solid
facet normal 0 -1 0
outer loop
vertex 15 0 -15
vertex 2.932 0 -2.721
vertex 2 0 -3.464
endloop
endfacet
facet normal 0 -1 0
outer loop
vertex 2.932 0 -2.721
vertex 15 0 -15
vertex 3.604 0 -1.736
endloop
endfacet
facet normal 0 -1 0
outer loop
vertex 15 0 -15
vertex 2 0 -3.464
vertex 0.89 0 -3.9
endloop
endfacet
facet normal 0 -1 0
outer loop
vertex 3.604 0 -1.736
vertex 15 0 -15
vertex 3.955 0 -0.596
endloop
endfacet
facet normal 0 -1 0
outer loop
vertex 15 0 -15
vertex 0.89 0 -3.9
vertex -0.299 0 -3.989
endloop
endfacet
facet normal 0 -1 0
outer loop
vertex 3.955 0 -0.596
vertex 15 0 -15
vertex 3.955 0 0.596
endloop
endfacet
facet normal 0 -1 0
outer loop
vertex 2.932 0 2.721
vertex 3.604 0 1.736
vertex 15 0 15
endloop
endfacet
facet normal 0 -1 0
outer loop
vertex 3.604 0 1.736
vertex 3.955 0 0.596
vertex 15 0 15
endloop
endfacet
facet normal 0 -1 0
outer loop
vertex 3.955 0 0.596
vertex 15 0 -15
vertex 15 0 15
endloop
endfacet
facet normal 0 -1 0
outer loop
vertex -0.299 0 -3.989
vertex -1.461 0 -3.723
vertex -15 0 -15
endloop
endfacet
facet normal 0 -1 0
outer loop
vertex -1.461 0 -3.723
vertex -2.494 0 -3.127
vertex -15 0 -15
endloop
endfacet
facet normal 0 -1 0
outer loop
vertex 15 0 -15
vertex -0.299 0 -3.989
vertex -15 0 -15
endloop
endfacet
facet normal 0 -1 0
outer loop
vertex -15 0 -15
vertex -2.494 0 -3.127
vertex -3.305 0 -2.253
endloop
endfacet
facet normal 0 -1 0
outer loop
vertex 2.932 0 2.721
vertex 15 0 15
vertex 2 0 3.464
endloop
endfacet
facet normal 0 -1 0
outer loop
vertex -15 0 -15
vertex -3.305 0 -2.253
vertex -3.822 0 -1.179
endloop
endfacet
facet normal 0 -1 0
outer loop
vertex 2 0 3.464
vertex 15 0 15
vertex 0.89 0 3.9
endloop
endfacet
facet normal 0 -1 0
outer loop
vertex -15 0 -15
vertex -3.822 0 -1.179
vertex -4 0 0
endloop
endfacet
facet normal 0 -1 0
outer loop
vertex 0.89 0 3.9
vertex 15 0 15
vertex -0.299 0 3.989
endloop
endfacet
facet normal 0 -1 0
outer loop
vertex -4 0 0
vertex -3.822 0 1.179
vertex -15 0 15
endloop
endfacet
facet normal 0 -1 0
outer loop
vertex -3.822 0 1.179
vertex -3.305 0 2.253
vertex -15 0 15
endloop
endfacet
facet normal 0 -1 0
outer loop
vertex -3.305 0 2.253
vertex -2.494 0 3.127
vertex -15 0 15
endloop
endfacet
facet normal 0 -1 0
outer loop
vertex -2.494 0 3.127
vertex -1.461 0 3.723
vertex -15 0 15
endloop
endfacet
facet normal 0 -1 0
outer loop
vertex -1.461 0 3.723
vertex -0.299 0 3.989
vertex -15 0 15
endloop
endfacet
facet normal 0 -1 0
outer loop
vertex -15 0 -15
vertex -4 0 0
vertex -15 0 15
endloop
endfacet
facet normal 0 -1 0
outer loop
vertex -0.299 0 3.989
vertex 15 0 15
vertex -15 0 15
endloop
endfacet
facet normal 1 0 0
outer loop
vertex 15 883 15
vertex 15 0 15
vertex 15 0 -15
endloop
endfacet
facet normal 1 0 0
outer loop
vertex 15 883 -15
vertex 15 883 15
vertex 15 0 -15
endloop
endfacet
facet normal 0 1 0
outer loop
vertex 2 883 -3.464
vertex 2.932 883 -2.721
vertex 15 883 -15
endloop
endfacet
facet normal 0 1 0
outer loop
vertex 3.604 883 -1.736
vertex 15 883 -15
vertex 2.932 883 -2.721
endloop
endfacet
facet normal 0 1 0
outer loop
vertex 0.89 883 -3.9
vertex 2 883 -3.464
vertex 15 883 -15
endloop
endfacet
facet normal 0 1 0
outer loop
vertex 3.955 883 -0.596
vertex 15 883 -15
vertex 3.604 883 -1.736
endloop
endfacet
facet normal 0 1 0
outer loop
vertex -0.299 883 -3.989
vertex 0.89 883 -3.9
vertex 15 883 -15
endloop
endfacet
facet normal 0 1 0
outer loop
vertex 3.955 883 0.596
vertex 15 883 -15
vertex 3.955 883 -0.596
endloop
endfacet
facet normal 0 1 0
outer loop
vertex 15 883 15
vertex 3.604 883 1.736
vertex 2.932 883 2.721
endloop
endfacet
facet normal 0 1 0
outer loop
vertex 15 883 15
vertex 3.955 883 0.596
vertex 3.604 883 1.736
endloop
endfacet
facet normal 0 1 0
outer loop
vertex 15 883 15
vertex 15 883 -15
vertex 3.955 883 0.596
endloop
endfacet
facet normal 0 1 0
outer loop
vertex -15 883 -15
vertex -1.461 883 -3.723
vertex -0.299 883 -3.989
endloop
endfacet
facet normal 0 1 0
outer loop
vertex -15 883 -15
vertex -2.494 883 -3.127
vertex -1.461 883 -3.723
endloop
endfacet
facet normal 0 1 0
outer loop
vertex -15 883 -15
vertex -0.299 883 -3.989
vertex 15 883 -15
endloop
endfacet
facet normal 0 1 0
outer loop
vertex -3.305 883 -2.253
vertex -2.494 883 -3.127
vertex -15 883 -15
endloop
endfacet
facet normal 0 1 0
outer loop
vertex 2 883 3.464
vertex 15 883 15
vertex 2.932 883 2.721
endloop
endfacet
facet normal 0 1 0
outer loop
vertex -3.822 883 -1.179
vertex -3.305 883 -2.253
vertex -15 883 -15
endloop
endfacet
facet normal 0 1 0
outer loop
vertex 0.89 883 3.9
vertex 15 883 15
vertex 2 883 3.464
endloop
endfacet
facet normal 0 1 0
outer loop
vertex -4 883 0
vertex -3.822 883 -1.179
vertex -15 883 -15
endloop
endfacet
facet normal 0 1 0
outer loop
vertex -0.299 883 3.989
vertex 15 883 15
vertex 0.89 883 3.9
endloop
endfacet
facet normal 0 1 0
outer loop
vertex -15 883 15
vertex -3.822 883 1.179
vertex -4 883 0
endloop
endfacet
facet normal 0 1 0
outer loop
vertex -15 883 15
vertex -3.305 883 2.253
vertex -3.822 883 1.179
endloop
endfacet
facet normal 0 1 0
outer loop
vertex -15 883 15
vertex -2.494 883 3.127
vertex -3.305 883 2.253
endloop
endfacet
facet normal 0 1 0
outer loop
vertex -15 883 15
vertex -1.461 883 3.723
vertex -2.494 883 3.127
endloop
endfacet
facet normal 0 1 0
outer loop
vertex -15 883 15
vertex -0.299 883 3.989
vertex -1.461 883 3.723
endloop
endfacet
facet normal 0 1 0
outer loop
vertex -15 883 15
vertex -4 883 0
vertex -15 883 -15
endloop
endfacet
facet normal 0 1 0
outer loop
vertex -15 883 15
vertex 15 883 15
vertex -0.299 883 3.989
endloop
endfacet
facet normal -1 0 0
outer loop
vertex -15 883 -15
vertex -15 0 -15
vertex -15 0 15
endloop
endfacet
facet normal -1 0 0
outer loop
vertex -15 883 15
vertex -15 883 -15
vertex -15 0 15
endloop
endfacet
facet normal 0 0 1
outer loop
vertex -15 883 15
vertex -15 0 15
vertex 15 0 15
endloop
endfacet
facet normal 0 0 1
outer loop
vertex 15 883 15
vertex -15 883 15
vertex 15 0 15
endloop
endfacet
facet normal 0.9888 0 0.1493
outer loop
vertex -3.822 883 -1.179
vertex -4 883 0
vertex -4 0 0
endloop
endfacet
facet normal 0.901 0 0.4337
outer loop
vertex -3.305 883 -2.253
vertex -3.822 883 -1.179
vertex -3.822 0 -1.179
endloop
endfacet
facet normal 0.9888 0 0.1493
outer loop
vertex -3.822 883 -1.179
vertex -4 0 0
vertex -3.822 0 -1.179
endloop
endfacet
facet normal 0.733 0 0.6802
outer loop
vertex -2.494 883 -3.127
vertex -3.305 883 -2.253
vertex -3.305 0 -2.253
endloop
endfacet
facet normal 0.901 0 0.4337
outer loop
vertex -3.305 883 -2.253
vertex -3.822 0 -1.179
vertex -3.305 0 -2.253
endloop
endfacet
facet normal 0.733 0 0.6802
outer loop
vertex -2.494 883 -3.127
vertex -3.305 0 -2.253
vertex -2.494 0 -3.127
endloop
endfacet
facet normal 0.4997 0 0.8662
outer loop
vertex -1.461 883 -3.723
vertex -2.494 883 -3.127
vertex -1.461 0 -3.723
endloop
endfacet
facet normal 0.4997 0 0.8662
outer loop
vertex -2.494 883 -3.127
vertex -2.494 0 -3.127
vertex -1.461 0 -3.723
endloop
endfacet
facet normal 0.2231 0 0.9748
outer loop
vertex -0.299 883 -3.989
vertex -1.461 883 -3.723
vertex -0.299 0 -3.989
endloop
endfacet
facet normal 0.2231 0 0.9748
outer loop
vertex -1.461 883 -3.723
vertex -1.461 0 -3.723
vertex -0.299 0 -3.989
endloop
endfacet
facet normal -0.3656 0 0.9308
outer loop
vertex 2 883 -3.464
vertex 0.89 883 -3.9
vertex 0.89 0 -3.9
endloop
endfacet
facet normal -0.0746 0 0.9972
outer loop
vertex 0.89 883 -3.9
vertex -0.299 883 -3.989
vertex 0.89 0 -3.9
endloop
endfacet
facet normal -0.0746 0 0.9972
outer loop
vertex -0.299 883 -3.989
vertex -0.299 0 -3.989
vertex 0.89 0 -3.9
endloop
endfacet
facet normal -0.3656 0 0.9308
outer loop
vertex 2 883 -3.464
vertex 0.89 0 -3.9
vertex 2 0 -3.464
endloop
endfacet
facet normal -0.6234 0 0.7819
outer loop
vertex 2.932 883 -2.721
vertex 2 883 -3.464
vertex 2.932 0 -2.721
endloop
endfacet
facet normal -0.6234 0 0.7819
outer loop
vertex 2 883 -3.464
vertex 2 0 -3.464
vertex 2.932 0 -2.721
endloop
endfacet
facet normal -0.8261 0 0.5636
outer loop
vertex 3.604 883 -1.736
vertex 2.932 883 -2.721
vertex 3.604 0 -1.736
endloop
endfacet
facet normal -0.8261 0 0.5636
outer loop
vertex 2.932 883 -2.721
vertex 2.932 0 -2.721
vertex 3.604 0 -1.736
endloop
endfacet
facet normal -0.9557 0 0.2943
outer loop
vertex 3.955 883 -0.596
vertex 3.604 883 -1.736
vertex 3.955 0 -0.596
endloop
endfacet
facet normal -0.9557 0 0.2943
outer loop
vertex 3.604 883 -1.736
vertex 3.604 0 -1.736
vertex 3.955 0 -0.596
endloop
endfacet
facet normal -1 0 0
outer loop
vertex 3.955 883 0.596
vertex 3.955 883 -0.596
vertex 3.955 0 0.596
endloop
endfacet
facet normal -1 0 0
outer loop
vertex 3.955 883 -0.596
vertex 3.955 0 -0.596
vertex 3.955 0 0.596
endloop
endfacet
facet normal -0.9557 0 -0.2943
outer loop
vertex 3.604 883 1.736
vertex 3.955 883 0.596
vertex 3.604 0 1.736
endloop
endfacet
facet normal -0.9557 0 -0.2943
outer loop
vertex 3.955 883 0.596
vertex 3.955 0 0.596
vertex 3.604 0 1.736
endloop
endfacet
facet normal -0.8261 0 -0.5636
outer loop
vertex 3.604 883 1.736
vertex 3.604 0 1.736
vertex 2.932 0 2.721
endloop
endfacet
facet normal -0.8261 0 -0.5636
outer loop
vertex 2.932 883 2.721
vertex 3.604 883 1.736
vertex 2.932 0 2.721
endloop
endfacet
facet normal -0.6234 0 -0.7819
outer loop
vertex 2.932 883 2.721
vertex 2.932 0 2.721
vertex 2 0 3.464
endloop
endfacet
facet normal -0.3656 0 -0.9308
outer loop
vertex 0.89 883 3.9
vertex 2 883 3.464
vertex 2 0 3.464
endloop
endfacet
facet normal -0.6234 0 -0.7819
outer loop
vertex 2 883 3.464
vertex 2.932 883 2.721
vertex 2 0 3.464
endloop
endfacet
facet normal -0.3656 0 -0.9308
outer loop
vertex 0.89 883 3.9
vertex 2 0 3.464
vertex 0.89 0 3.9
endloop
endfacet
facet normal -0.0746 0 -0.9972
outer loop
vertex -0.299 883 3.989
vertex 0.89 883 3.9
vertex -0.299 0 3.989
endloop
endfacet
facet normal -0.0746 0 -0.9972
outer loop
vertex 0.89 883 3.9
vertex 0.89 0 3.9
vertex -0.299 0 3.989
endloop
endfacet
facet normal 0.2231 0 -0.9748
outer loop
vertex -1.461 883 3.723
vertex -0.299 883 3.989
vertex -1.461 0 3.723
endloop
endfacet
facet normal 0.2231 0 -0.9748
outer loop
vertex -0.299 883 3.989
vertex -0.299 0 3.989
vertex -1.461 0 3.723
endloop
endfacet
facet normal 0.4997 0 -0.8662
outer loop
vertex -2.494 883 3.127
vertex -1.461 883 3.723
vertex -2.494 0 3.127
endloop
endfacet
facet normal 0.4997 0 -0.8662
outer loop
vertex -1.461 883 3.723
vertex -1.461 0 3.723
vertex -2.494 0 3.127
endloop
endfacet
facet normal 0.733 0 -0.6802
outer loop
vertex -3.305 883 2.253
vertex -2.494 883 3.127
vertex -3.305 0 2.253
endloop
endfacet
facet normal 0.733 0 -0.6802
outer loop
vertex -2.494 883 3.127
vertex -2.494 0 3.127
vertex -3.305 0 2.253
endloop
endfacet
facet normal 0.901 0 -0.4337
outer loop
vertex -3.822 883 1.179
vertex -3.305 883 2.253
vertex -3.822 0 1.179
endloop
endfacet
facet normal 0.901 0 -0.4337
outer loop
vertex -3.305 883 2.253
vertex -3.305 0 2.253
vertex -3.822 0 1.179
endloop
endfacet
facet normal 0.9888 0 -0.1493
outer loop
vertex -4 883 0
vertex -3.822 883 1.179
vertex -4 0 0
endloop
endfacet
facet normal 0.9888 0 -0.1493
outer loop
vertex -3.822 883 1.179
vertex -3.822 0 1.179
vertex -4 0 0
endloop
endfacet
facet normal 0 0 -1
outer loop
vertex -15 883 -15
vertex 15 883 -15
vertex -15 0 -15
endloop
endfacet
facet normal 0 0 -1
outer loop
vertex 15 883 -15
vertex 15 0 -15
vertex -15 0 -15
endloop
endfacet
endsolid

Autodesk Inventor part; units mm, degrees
ref_plane "YZ Plane" through (0, 0, 0) normal (1, 0, 0) x (0, 1, 0)
ref_plane "XZ Plane" through (0, 0, 0) normal (0, 1, 0) x (-1, 0, 0)
ref_plane "XY Plane" through (0, 0, 0) normal (0, 0, 1) x (1, 0, 0)
sketch "Boceto1" plane through (0, 0, 0) normal (0, 1, 0) x (-1, 0, 0)
  line L0 (15, 15) -> (-15, 15)
  line L1 (-15, 15) -> (-15, -15)
  line L2 (-15, -15) -> (15, -15)
  line L3 (15, -15) -> (15, 15)
  line L4 (15, 15) -> (-15, -15) construction
  circle A0 centre (0, 0) radius 4
  dimension "d0" = 30
  dimension "d1" = 8
extrude "Extrusión1" add sketch "Boceto1" along normal blind 883
properties part number "P_3030_1500"
